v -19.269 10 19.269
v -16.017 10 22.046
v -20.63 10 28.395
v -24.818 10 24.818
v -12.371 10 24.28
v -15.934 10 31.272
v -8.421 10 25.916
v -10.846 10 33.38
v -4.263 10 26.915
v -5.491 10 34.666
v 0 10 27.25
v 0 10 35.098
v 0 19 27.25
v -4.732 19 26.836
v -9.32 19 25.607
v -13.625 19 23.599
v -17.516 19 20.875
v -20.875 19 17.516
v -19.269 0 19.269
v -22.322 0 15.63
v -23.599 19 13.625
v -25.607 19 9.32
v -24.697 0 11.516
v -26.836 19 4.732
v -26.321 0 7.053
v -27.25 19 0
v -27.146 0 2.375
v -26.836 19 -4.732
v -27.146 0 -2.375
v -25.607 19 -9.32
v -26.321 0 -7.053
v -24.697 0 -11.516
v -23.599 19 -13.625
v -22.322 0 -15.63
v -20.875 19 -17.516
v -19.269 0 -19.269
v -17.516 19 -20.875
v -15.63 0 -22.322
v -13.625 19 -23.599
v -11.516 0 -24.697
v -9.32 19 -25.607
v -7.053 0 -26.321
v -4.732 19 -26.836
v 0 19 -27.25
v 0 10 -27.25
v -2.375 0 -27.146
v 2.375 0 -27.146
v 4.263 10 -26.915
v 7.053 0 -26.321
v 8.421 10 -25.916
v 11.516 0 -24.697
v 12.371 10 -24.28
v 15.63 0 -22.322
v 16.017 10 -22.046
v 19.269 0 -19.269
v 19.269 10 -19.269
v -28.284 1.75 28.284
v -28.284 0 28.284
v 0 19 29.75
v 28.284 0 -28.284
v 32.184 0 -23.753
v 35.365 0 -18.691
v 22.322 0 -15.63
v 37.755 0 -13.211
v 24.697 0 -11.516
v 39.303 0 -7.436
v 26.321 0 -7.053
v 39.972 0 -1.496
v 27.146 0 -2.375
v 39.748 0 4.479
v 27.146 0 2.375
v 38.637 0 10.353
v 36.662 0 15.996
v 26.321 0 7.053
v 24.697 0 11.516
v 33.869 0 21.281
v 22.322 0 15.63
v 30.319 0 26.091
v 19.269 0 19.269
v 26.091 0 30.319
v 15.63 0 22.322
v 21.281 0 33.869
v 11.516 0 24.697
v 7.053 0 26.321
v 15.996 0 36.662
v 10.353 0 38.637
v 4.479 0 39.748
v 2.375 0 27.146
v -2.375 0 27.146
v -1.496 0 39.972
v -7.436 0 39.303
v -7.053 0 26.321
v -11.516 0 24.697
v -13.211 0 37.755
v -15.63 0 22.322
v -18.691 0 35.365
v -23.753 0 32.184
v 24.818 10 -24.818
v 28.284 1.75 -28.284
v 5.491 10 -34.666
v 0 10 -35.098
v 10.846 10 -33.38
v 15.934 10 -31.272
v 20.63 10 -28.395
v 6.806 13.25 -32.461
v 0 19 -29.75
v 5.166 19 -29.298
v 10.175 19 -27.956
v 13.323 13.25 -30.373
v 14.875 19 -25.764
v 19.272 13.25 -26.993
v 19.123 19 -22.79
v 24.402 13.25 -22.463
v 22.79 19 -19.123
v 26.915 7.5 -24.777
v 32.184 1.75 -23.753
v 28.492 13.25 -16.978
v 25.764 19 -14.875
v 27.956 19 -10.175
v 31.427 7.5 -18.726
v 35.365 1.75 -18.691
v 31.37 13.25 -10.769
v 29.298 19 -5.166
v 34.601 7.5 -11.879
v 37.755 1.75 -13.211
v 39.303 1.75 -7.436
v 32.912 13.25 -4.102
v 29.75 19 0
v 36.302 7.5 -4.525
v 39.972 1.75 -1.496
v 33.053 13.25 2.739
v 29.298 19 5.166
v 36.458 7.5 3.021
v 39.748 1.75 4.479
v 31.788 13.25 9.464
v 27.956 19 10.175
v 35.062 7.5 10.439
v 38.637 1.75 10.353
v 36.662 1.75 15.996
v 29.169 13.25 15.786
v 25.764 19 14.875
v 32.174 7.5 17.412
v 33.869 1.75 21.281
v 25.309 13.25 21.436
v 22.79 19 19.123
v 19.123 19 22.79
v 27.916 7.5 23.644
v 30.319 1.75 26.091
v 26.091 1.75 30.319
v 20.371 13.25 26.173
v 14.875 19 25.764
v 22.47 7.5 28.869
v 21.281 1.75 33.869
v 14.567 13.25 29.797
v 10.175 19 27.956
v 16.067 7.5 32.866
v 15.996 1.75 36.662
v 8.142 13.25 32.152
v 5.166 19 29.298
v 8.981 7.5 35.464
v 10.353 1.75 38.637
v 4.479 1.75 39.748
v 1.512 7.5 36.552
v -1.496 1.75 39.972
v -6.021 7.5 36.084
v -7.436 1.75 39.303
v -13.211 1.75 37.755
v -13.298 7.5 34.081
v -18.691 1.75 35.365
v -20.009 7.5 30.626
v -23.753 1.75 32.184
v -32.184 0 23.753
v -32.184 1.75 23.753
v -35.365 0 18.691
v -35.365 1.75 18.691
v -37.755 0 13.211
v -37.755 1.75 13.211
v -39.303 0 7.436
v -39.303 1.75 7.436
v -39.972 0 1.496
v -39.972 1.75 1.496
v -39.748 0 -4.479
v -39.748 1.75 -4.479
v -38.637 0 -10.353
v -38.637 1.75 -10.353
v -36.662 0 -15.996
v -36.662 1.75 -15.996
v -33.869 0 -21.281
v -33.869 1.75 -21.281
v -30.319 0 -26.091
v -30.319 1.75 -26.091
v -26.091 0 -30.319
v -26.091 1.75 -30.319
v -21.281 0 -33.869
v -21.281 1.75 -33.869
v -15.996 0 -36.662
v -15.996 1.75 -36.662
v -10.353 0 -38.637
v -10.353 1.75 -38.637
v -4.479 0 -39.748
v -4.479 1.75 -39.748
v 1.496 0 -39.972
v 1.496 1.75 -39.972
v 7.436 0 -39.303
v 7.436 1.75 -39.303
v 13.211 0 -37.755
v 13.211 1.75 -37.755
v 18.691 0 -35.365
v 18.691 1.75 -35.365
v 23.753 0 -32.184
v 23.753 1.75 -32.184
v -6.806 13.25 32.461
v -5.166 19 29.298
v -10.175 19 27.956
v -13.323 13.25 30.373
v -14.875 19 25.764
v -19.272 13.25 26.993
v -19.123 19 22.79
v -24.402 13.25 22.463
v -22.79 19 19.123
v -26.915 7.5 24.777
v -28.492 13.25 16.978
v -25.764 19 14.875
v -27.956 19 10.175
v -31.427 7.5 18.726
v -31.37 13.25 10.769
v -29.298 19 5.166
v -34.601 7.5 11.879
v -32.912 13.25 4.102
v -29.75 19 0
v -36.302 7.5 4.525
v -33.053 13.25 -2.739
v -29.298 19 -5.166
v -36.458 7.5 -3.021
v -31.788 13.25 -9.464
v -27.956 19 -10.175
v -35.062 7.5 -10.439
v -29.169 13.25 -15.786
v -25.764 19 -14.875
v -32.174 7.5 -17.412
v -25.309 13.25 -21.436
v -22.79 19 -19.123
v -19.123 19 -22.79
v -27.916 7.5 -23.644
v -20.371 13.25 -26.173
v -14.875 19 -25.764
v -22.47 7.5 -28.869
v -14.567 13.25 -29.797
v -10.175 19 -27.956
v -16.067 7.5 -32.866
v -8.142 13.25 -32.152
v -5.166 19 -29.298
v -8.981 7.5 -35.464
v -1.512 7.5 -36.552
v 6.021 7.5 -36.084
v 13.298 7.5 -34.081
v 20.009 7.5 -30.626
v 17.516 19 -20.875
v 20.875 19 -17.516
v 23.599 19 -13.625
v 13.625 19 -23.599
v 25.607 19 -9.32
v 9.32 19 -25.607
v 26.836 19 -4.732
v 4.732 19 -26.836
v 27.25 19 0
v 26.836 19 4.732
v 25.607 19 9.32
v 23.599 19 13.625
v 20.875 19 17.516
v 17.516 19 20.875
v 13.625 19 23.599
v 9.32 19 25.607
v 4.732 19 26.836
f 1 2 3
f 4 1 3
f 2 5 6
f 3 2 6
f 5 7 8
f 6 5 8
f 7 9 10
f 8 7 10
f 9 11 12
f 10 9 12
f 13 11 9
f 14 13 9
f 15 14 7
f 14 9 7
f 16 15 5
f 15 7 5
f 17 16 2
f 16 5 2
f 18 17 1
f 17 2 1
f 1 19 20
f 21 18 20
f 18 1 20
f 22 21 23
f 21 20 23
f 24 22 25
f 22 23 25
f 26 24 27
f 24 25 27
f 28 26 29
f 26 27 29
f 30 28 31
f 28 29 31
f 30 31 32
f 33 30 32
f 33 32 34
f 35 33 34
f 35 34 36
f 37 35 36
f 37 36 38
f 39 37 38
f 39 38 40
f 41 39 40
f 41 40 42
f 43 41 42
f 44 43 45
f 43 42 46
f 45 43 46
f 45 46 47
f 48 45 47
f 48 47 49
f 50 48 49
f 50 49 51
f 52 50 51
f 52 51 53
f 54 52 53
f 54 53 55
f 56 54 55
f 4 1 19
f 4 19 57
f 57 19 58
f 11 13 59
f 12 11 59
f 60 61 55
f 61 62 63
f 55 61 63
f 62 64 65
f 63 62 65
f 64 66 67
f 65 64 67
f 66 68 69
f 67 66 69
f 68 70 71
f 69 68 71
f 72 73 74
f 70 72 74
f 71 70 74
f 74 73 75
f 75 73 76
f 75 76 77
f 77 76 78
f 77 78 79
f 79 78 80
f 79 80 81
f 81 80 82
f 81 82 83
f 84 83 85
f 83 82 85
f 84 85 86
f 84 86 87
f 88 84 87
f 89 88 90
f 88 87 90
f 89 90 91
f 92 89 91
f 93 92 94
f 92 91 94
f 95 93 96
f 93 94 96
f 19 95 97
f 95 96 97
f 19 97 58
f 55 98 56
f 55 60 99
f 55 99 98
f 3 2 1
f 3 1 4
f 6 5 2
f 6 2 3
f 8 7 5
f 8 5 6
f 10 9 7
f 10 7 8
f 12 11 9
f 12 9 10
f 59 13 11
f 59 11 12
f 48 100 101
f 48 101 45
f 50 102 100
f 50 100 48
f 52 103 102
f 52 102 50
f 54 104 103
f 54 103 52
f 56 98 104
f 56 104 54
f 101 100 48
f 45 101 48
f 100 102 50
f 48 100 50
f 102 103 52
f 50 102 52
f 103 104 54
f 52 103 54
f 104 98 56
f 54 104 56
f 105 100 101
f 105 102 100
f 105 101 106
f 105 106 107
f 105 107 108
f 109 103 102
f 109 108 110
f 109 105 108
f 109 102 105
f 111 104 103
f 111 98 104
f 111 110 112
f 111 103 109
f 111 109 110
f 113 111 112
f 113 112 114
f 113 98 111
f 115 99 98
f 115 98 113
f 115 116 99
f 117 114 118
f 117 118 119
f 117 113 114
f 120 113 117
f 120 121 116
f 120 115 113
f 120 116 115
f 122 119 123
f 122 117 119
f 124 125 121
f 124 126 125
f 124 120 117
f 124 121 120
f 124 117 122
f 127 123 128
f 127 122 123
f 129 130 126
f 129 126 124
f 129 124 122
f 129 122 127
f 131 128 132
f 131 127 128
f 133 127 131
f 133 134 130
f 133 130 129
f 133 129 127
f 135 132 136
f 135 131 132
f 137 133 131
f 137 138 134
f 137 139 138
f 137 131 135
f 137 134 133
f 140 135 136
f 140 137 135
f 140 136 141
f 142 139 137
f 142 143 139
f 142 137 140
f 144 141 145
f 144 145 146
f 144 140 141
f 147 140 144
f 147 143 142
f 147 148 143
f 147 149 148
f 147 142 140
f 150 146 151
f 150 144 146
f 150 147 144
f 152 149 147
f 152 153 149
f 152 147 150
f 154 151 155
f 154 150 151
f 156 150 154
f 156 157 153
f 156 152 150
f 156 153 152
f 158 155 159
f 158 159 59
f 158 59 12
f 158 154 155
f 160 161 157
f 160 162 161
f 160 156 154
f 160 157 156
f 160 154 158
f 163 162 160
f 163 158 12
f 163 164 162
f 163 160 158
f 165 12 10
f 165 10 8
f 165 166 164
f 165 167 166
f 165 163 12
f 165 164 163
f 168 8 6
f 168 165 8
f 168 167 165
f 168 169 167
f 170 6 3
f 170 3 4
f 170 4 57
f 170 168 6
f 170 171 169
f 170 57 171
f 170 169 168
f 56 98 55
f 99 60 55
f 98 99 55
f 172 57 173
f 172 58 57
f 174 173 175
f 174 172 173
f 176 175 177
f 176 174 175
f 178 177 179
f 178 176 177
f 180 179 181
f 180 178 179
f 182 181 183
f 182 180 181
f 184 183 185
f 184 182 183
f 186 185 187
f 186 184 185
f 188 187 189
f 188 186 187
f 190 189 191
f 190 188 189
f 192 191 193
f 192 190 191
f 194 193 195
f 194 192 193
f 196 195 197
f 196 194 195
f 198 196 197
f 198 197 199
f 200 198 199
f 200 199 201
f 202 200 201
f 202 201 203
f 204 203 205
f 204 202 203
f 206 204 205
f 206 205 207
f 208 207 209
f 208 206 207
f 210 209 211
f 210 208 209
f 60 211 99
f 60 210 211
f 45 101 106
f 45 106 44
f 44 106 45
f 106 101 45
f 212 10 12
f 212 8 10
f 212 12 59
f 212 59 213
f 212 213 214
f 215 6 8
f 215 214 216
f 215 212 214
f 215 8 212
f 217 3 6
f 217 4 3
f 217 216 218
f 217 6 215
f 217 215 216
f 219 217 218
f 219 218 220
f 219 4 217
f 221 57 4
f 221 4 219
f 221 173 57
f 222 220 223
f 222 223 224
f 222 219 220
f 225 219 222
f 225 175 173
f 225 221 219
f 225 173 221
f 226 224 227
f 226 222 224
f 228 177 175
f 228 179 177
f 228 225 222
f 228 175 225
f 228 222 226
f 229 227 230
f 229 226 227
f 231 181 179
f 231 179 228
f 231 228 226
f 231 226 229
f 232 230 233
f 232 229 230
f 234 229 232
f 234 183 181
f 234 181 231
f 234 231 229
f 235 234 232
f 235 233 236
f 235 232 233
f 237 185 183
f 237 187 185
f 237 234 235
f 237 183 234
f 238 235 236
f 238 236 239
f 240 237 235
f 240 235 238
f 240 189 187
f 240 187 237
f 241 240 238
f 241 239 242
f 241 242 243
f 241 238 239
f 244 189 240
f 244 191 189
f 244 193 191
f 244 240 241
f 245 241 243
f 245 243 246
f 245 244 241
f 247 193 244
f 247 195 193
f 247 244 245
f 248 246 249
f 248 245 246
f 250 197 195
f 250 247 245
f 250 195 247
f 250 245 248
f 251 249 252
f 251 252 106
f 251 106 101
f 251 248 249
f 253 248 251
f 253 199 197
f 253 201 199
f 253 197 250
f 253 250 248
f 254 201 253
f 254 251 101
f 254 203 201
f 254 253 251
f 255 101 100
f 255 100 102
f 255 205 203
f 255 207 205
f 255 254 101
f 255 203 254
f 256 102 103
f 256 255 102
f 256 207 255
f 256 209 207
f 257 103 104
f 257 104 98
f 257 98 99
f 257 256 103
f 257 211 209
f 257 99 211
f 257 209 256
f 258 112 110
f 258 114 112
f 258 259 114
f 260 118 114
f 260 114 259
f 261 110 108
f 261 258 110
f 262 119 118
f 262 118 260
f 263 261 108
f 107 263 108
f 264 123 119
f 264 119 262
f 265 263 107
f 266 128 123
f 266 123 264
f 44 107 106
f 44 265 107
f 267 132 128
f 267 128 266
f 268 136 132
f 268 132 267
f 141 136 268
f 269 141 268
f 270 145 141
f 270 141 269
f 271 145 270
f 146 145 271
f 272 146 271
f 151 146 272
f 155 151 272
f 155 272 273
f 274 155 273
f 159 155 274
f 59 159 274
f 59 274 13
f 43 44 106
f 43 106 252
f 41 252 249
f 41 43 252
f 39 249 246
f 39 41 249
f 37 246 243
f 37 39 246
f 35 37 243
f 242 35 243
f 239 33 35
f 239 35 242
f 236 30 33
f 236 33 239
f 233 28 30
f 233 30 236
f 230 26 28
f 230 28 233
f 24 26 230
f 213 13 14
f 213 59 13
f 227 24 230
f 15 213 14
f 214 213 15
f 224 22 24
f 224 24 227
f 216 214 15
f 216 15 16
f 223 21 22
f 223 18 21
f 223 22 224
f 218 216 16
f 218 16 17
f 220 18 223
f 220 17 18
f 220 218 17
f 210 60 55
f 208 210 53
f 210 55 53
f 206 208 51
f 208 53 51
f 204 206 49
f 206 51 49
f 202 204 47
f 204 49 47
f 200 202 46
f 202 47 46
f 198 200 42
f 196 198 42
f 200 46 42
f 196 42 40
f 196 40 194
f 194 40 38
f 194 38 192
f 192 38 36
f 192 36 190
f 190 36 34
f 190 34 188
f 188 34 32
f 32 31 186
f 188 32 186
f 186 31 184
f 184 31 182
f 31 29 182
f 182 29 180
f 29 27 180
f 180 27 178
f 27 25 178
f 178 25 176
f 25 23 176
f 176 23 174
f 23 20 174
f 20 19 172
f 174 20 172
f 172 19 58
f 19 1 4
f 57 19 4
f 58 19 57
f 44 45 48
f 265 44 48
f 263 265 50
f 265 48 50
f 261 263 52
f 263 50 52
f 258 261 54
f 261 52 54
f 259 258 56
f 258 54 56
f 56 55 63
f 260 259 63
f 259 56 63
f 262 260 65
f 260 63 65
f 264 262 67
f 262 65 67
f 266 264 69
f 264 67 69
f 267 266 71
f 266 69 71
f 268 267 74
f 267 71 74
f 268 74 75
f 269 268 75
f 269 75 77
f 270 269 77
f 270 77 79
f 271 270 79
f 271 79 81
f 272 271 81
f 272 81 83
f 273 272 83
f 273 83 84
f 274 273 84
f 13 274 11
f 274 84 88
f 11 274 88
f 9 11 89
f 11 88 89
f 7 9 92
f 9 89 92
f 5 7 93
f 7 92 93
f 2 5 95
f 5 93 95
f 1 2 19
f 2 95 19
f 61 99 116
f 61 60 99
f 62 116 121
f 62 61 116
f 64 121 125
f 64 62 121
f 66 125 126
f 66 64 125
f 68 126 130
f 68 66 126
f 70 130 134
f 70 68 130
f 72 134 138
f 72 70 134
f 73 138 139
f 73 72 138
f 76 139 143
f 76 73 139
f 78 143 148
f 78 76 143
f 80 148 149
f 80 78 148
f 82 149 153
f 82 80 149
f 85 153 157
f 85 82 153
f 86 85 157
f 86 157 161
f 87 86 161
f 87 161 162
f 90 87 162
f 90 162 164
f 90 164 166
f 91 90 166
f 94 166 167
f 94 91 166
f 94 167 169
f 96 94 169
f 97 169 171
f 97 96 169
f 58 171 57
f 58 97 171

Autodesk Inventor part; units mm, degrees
ref_plane "YZ Plane" through (0, 0, 0) normal (1, 0, 0) x (0, 1, 0)
sketch "Sketch1" plane through (0, 0, 0) normal (0, 1, 0) x (-1, 0, 0)
  circle A0 centre (0, 0) radius 27.25
  circle A1 centre (0, 0) radius 40
  line L0 (0, 0) -> (40, 0)
  line L1 (0, 0) -> (-40, 0)
  dimension "d0" = 54.5
  dimension "d1" = 80
  dimension "d2" = 12.75
extrude "Extrusion1" add sketch "Sketch1" along normal blind 19 contours L0 A1 L1 A0 | A0 L1 A1 L0
chamfer "Chamfer2" distance 10.25 distance2 17.25 1 edges at (40, 19, 0) measured on face at (17.5776, 19, -30.8976)
ref_plane "Work Plane1" through (0, 10, 0) normal (0, 1, 0) x (-1, 0, 0)
split body "Split1" result two bodies by plane through (0, 10, 0) normal (0, 1, 0) first body at (-8.6629, 11.2446, 32.6469)
split body "Split2" result two bodies by plane through (0, 0, 0) normal (1, 0, 0) bodies 2 first body at (2.4575, 12.7446, 32.7934)
sketch "Sketch2" plane through (0, 19, 0) normal (0, 1, 0) x (1, 0, 0)
  arc A0 (0, 27.25) -> (-27.25, 0) centre (0, 0) ccw projected
  line L0 (-27.25, 0) -> (27.25, 0)
  arc A1 (0, -27.25) -> (0, 27.25) centre (0, 0) ccw projected
  line L1 (0, 0) -> (-21.0364, -21.0364)
  arc A2 (-29.75, 0) -> (0, -29.75) centre (0, 0) ccw projected
  line L2 (0, 0) -> (29.75, 0) construction
  dimension "d12" = 135
ref_plane "Work Plane2" through (0, 19, 0) normal (0.7071068, 0, 0.7071068) x (-0.7071068, 0, 0.7071068)
split body "Split3" result two bodies by plane through (0, 19, 0) normal (0.7071068, 0, 0.7071068) bodies 3 first body at (25.9031, 0.5, 24.3547)
combine bodies "Combine1" operation type add bodies to combine 6 4
combine bodies "Combine2" operation type add bodies to combine 7 5
properties part number "Kolanko"
